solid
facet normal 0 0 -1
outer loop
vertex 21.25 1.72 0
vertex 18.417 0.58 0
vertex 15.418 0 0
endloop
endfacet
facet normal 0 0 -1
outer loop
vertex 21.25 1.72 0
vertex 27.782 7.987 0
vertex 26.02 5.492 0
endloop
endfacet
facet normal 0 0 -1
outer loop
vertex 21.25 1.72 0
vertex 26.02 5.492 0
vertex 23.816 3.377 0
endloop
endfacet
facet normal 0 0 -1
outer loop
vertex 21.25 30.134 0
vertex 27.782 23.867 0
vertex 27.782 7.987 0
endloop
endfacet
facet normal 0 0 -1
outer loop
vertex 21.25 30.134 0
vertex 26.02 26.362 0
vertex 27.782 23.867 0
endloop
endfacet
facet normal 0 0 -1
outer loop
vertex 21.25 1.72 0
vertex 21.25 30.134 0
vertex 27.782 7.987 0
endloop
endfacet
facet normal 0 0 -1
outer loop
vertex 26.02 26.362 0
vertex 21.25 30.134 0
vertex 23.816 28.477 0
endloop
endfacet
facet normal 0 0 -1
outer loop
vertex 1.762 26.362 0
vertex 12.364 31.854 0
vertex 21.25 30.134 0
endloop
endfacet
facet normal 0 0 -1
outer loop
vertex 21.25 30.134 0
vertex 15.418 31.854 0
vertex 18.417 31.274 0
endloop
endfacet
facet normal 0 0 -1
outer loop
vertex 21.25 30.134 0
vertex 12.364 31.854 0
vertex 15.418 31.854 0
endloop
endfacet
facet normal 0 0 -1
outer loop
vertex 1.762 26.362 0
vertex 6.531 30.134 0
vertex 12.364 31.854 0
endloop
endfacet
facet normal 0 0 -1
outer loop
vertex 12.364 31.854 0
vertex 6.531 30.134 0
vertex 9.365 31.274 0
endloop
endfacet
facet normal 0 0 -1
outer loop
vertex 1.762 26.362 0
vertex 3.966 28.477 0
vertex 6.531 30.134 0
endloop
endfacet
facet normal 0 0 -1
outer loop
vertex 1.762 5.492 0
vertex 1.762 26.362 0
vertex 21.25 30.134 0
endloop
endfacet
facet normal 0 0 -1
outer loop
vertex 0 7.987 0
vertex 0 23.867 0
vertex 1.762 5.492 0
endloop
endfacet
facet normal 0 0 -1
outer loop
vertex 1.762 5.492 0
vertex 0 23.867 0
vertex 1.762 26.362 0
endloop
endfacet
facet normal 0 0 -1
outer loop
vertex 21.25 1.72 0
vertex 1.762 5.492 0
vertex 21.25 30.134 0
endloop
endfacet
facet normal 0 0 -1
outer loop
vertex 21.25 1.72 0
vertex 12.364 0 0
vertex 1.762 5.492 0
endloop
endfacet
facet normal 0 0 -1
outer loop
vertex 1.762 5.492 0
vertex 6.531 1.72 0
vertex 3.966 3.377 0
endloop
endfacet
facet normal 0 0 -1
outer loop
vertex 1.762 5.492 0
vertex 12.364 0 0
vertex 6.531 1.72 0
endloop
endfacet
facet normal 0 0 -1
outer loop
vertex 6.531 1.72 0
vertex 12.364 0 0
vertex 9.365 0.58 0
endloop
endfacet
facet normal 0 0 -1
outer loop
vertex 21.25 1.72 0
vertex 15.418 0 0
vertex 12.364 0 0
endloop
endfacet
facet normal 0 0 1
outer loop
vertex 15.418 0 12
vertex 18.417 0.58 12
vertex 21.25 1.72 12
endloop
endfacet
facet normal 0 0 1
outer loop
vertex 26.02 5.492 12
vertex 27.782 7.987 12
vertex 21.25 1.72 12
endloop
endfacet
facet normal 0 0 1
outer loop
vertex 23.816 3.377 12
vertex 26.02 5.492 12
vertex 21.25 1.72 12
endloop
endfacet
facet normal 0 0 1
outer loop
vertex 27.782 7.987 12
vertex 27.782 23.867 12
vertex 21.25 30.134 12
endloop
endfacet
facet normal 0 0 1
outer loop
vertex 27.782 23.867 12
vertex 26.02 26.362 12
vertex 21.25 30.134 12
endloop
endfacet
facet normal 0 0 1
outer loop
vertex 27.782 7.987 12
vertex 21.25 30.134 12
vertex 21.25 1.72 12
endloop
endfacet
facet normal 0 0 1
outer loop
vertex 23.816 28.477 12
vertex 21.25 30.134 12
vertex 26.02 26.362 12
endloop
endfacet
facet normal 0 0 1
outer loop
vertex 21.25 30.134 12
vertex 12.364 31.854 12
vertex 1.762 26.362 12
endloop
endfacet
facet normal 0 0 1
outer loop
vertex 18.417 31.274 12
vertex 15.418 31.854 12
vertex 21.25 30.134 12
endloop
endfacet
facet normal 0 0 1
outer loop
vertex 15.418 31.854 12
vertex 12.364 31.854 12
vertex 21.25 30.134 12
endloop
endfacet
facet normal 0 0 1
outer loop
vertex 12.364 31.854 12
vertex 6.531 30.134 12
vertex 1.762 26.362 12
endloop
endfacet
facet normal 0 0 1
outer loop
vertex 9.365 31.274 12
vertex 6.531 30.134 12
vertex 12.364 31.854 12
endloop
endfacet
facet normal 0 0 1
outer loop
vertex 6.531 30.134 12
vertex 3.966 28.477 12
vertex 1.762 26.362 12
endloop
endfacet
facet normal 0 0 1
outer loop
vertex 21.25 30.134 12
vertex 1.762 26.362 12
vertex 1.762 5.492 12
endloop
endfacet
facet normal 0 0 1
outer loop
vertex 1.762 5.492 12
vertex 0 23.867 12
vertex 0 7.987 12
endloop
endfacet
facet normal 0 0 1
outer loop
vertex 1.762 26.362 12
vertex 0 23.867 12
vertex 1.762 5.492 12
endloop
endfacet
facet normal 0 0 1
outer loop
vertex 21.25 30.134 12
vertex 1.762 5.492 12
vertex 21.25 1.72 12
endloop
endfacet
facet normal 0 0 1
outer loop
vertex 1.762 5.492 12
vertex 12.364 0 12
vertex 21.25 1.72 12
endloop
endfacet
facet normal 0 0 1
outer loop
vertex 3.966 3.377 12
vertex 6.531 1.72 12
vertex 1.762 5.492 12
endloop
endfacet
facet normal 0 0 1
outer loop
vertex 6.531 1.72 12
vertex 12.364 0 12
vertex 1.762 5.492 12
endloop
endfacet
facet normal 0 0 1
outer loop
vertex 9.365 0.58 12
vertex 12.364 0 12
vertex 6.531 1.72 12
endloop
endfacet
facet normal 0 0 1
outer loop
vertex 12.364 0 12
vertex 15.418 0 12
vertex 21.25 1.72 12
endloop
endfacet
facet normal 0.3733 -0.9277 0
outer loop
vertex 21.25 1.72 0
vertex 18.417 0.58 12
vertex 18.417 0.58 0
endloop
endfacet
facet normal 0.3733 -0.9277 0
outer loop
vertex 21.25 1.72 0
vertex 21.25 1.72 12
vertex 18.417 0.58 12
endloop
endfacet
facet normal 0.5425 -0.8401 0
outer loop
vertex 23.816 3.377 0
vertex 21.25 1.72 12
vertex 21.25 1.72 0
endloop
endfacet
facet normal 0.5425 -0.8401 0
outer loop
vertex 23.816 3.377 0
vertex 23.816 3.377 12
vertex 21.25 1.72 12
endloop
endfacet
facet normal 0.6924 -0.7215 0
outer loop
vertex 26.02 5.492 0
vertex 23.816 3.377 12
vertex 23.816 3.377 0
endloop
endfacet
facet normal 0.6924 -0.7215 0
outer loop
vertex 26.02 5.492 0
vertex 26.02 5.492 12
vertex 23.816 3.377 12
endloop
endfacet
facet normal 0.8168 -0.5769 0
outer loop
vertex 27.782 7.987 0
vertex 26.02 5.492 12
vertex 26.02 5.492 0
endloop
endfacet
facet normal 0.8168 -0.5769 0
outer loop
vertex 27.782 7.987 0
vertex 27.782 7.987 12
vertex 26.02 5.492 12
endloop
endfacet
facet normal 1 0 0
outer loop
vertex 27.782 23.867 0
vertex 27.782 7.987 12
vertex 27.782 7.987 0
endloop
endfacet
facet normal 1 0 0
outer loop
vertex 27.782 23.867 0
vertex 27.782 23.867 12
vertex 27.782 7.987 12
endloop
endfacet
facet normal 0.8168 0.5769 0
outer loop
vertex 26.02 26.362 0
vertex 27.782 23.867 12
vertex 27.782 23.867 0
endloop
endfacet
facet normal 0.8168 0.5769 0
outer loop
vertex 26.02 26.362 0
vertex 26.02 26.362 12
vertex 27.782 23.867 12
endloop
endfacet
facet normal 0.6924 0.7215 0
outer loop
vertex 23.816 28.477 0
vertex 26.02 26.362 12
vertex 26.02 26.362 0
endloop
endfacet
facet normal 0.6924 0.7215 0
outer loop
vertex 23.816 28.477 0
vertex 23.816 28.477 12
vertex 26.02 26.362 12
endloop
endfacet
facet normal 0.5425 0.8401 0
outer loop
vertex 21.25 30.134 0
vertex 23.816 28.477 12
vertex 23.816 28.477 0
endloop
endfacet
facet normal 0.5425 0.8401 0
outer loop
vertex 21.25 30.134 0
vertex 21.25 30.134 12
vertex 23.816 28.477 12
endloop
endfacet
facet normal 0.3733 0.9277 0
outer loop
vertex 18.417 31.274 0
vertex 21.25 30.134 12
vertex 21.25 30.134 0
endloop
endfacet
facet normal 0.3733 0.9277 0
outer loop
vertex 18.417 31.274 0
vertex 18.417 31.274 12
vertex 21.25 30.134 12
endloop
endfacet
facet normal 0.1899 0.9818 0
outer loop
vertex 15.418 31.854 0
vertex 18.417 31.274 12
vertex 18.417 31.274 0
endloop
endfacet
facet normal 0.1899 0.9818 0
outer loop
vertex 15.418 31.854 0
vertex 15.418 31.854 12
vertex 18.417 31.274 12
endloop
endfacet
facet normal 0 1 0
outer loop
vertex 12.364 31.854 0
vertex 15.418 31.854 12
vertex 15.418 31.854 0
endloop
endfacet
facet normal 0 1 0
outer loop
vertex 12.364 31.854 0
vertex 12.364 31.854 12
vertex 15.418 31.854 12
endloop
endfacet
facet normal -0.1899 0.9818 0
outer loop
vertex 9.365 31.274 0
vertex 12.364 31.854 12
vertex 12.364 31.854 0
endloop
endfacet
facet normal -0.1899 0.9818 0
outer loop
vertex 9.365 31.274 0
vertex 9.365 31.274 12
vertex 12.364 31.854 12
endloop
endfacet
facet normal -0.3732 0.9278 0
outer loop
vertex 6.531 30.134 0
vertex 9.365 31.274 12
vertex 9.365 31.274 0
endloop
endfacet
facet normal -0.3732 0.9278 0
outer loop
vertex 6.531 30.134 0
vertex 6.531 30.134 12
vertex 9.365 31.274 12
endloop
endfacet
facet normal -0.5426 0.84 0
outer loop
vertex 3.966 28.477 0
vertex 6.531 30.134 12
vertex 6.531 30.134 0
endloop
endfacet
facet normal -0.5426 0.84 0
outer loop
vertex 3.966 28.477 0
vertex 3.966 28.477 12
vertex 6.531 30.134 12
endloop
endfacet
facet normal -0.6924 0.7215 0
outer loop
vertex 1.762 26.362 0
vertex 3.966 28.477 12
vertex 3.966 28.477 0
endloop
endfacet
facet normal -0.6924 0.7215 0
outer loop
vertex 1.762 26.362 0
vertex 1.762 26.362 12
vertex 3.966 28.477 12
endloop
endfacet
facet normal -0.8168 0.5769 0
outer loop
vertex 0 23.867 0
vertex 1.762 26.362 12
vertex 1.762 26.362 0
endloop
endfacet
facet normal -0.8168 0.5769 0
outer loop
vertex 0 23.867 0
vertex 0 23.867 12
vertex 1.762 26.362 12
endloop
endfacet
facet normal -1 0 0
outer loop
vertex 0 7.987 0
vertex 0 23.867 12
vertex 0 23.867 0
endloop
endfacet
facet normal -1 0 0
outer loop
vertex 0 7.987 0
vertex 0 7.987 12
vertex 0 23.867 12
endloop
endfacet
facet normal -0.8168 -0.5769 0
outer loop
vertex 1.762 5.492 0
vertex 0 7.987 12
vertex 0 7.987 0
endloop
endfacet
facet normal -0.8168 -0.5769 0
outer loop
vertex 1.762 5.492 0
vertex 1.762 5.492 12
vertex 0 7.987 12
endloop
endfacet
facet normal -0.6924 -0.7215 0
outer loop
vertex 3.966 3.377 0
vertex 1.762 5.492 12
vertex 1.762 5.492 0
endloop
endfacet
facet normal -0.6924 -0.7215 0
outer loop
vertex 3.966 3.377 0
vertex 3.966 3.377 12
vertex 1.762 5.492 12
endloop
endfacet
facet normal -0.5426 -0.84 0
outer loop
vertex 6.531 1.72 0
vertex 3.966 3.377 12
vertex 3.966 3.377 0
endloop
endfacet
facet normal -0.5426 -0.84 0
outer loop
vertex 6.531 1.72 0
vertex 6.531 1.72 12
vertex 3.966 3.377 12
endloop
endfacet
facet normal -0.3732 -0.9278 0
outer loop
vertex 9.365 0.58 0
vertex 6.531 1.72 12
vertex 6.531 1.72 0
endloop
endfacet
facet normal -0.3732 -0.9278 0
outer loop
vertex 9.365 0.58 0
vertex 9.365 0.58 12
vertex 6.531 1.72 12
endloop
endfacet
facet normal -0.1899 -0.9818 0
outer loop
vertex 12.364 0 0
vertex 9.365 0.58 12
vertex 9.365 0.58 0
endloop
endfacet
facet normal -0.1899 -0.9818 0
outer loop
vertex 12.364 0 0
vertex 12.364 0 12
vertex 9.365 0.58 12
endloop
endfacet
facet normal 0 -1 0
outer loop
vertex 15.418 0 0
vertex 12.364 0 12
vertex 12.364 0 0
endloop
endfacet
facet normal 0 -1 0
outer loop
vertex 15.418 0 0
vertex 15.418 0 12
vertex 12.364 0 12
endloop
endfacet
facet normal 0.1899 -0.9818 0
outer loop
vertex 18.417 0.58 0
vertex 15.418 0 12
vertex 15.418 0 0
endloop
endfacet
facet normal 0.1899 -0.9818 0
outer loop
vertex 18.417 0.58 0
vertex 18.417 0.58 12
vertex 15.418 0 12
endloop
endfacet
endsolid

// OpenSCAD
$fn = 32;

// ----------------------------------------------------------------------
// Flat adaptor: double_d, 12 mm thick
// ----------------------------------------------------------------------

// --- parameters (mm) ---
profile_height = 12;      // extrusion height
profile_points = 24;      // points of the closed outline

profile = [[27.782, 23.867], [26.02, 26.362], [23.816, 28.477], [21.25, 30.134], [18.417, 31.274], [15.418, 31.854], [12.364, 31.854], [9.365, 31.274], [6.531, 30.134], [3.966, 28.477], [1.762, 26.362], [0, 23.867], [0, 7.987], [1.762, 5.492], [3.966, 3.377], [6.531, 1.72], [9.365, 0.58], [12.364, 0], [15.418, 0], [18.417, 0.58], [21.25, 1.72], [23.816, 3.377], [26.02, 5.492], [27.782, 7.987]];  // single closed polygon, 24 points, counter clockwise

// --- the one profile operation ---
linear_extrude(height = profile_height) polygon(points = profile);
